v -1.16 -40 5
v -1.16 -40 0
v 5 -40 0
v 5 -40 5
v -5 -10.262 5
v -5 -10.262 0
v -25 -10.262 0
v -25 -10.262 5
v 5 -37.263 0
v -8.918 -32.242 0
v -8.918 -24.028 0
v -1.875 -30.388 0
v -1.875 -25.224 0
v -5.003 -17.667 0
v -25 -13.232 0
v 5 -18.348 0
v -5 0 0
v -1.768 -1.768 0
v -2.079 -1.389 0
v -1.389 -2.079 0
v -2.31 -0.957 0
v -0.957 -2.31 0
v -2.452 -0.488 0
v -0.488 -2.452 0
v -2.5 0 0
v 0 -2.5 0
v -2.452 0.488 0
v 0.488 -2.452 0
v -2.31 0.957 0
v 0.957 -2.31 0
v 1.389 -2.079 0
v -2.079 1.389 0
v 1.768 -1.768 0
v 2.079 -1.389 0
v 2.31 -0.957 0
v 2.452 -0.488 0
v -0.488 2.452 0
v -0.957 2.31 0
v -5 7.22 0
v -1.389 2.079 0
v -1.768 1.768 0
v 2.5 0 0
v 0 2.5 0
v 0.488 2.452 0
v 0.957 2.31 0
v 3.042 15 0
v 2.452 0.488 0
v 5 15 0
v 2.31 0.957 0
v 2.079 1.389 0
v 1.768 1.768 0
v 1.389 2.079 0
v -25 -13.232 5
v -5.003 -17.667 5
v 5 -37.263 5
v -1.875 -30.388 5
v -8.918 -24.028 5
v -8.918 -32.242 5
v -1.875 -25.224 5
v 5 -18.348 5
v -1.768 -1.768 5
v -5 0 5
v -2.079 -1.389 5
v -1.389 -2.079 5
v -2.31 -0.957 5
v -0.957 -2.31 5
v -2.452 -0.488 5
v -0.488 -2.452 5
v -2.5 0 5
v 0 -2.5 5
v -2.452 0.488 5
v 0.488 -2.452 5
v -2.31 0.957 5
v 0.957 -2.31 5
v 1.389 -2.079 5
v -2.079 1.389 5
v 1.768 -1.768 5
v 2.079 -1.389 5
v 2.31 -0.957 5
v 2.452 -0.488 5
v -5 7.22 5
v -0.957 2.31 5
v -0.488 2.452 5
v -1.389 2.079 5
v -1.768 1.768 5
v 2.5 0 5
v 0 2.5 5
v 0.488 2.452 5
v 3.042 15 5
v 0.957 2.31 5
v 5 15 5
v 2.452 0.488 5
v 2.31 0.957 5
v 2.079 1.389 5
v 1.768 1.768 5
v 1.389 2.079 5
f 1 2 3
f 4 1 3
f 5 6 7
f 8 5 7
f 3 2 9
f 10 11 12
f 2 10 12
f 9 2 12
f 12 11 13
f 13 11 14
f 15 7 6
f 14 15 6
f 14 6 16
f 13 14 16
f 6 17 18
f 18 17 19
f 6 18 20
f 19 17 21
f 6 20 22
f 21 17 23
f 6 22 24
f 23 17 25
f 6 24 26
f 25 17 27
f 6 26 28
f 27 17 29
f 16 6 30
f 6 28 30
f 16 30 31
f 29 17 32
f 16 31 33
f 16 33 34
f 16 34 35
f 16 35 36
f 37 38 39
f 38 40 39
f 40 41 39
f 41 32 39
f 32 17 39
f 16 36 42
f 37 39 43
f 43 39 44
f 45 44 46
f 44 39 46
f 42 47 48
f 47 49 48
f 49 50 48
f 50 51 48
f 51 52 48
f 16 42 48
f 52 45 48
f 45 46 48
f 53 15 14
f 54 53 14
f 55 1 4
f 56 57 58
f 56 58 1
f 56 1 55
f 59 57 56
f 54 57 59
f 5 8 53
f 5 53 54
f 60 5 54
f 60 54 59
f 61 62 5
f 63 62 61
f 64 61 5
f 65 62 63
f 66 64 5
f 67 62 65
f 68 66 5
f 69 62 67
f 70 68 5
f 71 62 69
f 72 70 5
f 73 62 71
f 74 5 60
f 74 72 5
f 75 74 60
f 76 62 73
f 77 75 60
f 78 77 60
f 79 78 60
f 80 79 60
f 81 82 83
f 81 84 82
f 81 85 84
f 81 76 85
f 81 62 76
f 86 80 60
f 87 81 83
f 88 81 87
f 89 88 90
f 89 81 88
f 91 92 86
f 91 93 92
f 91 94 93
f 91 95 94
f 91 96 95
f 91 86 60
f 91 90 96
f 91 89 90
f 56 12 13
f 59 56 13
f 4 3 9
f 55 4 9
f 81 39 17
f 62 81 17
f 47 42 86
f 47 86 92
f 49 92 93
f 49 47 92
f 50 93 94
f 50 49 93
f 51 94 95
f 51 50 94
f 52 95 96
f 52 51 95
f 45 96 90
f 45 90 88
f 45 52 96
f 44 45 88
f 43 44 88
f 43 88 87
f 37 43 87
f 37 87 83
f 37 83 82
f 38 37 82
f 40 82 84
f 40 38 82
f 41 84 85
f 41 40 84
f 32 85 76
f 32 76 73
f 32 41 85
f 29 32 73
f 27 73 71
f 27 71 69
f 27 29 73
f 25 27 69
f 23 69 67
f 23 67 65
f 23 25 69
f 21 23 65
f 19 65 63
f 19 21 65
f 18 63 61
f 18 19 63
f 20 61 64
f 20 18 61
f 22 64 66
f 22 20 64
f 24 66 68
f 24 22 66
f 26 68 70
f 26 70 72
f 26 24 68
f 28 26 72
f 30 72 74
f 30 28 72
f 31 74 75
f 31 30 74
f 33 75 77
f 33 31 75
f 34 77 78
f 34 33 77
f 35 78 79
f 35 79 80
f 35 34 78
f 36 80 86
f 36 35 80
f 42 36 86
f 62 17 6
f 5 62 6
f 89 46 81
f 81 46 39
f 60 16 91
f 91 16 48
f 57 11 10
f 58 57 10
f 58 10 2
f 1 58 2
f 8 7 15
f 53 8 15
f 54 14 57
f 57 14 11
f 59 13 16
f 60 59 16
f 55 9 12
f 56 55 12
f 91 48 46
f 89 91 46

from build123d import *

# Parameters (mm, degrees)
SKETCH_1_R      = 5
SKETCH_1_R_2    = 2.5
EXTRUDE_1_DEPTH = 5


with BuildPart() as part:
    # 스케치1 → 보스-돌출1 (new body)
    # profile 1 of 3: a face of its own
    with BuildSketch(Plane.XY):
        with BuildLine():
            ThreePointArc((-5, 0), (0, 5), (5, 0))
            Line((5, 0), (5, 15))
            Line((5, 15), (3.042493031, 15))
            Line((3.042493031, 15), (-5, 7.220187609))
            Line((-5, 7.220187609), (-5, 0))
        make_face()
    # profile 2 of 3: a face of its own
    with BuildSketch(Plane.XY):
        Circle(SKETCH_1_R)
        Circle(SKETCH_1_R_2, mode=Mode.SUBTRACT)
    # profile 3 of 3: a face of its own
    with BuildSketch(Plane.XY):
        with BuildLine():
            Line((5, -18.348194171), (5, 0))
            ThreePointArc((5, 0), (0, -5), (-5, 0))
            Line((-5, 0), (-4.999740664, -10.261800472))
            Line((-4.999740664, -10.261800472), (-25, -10.261800472))
            Line((-25, -10.261800472), (-25, -13.231879179))
            Line((-25, -13.231879179), (-5.003340767, -17.667219117))
            Line((-5.003340767, -17.667219117), (-8.918287267, -24.027561259))
            Line((-8.918287267, -24.027561259), (-8.918287267, -32.241958326))
            Line((-8.918287267, -32.241958326), (-1.160245593, -40))
            Line((-1.160245593, -40), (5, -40))
            Line((5, -40), (5, -37.263121262))
            Line((5, -37.263121262), (-1.875384477, -30.387736785))
            Line((-1.875384477, -30.387736785), (-1.875384477, -25.223578647))
            Line((-1.875384477, -25.223578647), (5, -18.348194171))
        make_face()
    extrude(amount=EXTRUDE_1_DEPTH)


solid = part.part
